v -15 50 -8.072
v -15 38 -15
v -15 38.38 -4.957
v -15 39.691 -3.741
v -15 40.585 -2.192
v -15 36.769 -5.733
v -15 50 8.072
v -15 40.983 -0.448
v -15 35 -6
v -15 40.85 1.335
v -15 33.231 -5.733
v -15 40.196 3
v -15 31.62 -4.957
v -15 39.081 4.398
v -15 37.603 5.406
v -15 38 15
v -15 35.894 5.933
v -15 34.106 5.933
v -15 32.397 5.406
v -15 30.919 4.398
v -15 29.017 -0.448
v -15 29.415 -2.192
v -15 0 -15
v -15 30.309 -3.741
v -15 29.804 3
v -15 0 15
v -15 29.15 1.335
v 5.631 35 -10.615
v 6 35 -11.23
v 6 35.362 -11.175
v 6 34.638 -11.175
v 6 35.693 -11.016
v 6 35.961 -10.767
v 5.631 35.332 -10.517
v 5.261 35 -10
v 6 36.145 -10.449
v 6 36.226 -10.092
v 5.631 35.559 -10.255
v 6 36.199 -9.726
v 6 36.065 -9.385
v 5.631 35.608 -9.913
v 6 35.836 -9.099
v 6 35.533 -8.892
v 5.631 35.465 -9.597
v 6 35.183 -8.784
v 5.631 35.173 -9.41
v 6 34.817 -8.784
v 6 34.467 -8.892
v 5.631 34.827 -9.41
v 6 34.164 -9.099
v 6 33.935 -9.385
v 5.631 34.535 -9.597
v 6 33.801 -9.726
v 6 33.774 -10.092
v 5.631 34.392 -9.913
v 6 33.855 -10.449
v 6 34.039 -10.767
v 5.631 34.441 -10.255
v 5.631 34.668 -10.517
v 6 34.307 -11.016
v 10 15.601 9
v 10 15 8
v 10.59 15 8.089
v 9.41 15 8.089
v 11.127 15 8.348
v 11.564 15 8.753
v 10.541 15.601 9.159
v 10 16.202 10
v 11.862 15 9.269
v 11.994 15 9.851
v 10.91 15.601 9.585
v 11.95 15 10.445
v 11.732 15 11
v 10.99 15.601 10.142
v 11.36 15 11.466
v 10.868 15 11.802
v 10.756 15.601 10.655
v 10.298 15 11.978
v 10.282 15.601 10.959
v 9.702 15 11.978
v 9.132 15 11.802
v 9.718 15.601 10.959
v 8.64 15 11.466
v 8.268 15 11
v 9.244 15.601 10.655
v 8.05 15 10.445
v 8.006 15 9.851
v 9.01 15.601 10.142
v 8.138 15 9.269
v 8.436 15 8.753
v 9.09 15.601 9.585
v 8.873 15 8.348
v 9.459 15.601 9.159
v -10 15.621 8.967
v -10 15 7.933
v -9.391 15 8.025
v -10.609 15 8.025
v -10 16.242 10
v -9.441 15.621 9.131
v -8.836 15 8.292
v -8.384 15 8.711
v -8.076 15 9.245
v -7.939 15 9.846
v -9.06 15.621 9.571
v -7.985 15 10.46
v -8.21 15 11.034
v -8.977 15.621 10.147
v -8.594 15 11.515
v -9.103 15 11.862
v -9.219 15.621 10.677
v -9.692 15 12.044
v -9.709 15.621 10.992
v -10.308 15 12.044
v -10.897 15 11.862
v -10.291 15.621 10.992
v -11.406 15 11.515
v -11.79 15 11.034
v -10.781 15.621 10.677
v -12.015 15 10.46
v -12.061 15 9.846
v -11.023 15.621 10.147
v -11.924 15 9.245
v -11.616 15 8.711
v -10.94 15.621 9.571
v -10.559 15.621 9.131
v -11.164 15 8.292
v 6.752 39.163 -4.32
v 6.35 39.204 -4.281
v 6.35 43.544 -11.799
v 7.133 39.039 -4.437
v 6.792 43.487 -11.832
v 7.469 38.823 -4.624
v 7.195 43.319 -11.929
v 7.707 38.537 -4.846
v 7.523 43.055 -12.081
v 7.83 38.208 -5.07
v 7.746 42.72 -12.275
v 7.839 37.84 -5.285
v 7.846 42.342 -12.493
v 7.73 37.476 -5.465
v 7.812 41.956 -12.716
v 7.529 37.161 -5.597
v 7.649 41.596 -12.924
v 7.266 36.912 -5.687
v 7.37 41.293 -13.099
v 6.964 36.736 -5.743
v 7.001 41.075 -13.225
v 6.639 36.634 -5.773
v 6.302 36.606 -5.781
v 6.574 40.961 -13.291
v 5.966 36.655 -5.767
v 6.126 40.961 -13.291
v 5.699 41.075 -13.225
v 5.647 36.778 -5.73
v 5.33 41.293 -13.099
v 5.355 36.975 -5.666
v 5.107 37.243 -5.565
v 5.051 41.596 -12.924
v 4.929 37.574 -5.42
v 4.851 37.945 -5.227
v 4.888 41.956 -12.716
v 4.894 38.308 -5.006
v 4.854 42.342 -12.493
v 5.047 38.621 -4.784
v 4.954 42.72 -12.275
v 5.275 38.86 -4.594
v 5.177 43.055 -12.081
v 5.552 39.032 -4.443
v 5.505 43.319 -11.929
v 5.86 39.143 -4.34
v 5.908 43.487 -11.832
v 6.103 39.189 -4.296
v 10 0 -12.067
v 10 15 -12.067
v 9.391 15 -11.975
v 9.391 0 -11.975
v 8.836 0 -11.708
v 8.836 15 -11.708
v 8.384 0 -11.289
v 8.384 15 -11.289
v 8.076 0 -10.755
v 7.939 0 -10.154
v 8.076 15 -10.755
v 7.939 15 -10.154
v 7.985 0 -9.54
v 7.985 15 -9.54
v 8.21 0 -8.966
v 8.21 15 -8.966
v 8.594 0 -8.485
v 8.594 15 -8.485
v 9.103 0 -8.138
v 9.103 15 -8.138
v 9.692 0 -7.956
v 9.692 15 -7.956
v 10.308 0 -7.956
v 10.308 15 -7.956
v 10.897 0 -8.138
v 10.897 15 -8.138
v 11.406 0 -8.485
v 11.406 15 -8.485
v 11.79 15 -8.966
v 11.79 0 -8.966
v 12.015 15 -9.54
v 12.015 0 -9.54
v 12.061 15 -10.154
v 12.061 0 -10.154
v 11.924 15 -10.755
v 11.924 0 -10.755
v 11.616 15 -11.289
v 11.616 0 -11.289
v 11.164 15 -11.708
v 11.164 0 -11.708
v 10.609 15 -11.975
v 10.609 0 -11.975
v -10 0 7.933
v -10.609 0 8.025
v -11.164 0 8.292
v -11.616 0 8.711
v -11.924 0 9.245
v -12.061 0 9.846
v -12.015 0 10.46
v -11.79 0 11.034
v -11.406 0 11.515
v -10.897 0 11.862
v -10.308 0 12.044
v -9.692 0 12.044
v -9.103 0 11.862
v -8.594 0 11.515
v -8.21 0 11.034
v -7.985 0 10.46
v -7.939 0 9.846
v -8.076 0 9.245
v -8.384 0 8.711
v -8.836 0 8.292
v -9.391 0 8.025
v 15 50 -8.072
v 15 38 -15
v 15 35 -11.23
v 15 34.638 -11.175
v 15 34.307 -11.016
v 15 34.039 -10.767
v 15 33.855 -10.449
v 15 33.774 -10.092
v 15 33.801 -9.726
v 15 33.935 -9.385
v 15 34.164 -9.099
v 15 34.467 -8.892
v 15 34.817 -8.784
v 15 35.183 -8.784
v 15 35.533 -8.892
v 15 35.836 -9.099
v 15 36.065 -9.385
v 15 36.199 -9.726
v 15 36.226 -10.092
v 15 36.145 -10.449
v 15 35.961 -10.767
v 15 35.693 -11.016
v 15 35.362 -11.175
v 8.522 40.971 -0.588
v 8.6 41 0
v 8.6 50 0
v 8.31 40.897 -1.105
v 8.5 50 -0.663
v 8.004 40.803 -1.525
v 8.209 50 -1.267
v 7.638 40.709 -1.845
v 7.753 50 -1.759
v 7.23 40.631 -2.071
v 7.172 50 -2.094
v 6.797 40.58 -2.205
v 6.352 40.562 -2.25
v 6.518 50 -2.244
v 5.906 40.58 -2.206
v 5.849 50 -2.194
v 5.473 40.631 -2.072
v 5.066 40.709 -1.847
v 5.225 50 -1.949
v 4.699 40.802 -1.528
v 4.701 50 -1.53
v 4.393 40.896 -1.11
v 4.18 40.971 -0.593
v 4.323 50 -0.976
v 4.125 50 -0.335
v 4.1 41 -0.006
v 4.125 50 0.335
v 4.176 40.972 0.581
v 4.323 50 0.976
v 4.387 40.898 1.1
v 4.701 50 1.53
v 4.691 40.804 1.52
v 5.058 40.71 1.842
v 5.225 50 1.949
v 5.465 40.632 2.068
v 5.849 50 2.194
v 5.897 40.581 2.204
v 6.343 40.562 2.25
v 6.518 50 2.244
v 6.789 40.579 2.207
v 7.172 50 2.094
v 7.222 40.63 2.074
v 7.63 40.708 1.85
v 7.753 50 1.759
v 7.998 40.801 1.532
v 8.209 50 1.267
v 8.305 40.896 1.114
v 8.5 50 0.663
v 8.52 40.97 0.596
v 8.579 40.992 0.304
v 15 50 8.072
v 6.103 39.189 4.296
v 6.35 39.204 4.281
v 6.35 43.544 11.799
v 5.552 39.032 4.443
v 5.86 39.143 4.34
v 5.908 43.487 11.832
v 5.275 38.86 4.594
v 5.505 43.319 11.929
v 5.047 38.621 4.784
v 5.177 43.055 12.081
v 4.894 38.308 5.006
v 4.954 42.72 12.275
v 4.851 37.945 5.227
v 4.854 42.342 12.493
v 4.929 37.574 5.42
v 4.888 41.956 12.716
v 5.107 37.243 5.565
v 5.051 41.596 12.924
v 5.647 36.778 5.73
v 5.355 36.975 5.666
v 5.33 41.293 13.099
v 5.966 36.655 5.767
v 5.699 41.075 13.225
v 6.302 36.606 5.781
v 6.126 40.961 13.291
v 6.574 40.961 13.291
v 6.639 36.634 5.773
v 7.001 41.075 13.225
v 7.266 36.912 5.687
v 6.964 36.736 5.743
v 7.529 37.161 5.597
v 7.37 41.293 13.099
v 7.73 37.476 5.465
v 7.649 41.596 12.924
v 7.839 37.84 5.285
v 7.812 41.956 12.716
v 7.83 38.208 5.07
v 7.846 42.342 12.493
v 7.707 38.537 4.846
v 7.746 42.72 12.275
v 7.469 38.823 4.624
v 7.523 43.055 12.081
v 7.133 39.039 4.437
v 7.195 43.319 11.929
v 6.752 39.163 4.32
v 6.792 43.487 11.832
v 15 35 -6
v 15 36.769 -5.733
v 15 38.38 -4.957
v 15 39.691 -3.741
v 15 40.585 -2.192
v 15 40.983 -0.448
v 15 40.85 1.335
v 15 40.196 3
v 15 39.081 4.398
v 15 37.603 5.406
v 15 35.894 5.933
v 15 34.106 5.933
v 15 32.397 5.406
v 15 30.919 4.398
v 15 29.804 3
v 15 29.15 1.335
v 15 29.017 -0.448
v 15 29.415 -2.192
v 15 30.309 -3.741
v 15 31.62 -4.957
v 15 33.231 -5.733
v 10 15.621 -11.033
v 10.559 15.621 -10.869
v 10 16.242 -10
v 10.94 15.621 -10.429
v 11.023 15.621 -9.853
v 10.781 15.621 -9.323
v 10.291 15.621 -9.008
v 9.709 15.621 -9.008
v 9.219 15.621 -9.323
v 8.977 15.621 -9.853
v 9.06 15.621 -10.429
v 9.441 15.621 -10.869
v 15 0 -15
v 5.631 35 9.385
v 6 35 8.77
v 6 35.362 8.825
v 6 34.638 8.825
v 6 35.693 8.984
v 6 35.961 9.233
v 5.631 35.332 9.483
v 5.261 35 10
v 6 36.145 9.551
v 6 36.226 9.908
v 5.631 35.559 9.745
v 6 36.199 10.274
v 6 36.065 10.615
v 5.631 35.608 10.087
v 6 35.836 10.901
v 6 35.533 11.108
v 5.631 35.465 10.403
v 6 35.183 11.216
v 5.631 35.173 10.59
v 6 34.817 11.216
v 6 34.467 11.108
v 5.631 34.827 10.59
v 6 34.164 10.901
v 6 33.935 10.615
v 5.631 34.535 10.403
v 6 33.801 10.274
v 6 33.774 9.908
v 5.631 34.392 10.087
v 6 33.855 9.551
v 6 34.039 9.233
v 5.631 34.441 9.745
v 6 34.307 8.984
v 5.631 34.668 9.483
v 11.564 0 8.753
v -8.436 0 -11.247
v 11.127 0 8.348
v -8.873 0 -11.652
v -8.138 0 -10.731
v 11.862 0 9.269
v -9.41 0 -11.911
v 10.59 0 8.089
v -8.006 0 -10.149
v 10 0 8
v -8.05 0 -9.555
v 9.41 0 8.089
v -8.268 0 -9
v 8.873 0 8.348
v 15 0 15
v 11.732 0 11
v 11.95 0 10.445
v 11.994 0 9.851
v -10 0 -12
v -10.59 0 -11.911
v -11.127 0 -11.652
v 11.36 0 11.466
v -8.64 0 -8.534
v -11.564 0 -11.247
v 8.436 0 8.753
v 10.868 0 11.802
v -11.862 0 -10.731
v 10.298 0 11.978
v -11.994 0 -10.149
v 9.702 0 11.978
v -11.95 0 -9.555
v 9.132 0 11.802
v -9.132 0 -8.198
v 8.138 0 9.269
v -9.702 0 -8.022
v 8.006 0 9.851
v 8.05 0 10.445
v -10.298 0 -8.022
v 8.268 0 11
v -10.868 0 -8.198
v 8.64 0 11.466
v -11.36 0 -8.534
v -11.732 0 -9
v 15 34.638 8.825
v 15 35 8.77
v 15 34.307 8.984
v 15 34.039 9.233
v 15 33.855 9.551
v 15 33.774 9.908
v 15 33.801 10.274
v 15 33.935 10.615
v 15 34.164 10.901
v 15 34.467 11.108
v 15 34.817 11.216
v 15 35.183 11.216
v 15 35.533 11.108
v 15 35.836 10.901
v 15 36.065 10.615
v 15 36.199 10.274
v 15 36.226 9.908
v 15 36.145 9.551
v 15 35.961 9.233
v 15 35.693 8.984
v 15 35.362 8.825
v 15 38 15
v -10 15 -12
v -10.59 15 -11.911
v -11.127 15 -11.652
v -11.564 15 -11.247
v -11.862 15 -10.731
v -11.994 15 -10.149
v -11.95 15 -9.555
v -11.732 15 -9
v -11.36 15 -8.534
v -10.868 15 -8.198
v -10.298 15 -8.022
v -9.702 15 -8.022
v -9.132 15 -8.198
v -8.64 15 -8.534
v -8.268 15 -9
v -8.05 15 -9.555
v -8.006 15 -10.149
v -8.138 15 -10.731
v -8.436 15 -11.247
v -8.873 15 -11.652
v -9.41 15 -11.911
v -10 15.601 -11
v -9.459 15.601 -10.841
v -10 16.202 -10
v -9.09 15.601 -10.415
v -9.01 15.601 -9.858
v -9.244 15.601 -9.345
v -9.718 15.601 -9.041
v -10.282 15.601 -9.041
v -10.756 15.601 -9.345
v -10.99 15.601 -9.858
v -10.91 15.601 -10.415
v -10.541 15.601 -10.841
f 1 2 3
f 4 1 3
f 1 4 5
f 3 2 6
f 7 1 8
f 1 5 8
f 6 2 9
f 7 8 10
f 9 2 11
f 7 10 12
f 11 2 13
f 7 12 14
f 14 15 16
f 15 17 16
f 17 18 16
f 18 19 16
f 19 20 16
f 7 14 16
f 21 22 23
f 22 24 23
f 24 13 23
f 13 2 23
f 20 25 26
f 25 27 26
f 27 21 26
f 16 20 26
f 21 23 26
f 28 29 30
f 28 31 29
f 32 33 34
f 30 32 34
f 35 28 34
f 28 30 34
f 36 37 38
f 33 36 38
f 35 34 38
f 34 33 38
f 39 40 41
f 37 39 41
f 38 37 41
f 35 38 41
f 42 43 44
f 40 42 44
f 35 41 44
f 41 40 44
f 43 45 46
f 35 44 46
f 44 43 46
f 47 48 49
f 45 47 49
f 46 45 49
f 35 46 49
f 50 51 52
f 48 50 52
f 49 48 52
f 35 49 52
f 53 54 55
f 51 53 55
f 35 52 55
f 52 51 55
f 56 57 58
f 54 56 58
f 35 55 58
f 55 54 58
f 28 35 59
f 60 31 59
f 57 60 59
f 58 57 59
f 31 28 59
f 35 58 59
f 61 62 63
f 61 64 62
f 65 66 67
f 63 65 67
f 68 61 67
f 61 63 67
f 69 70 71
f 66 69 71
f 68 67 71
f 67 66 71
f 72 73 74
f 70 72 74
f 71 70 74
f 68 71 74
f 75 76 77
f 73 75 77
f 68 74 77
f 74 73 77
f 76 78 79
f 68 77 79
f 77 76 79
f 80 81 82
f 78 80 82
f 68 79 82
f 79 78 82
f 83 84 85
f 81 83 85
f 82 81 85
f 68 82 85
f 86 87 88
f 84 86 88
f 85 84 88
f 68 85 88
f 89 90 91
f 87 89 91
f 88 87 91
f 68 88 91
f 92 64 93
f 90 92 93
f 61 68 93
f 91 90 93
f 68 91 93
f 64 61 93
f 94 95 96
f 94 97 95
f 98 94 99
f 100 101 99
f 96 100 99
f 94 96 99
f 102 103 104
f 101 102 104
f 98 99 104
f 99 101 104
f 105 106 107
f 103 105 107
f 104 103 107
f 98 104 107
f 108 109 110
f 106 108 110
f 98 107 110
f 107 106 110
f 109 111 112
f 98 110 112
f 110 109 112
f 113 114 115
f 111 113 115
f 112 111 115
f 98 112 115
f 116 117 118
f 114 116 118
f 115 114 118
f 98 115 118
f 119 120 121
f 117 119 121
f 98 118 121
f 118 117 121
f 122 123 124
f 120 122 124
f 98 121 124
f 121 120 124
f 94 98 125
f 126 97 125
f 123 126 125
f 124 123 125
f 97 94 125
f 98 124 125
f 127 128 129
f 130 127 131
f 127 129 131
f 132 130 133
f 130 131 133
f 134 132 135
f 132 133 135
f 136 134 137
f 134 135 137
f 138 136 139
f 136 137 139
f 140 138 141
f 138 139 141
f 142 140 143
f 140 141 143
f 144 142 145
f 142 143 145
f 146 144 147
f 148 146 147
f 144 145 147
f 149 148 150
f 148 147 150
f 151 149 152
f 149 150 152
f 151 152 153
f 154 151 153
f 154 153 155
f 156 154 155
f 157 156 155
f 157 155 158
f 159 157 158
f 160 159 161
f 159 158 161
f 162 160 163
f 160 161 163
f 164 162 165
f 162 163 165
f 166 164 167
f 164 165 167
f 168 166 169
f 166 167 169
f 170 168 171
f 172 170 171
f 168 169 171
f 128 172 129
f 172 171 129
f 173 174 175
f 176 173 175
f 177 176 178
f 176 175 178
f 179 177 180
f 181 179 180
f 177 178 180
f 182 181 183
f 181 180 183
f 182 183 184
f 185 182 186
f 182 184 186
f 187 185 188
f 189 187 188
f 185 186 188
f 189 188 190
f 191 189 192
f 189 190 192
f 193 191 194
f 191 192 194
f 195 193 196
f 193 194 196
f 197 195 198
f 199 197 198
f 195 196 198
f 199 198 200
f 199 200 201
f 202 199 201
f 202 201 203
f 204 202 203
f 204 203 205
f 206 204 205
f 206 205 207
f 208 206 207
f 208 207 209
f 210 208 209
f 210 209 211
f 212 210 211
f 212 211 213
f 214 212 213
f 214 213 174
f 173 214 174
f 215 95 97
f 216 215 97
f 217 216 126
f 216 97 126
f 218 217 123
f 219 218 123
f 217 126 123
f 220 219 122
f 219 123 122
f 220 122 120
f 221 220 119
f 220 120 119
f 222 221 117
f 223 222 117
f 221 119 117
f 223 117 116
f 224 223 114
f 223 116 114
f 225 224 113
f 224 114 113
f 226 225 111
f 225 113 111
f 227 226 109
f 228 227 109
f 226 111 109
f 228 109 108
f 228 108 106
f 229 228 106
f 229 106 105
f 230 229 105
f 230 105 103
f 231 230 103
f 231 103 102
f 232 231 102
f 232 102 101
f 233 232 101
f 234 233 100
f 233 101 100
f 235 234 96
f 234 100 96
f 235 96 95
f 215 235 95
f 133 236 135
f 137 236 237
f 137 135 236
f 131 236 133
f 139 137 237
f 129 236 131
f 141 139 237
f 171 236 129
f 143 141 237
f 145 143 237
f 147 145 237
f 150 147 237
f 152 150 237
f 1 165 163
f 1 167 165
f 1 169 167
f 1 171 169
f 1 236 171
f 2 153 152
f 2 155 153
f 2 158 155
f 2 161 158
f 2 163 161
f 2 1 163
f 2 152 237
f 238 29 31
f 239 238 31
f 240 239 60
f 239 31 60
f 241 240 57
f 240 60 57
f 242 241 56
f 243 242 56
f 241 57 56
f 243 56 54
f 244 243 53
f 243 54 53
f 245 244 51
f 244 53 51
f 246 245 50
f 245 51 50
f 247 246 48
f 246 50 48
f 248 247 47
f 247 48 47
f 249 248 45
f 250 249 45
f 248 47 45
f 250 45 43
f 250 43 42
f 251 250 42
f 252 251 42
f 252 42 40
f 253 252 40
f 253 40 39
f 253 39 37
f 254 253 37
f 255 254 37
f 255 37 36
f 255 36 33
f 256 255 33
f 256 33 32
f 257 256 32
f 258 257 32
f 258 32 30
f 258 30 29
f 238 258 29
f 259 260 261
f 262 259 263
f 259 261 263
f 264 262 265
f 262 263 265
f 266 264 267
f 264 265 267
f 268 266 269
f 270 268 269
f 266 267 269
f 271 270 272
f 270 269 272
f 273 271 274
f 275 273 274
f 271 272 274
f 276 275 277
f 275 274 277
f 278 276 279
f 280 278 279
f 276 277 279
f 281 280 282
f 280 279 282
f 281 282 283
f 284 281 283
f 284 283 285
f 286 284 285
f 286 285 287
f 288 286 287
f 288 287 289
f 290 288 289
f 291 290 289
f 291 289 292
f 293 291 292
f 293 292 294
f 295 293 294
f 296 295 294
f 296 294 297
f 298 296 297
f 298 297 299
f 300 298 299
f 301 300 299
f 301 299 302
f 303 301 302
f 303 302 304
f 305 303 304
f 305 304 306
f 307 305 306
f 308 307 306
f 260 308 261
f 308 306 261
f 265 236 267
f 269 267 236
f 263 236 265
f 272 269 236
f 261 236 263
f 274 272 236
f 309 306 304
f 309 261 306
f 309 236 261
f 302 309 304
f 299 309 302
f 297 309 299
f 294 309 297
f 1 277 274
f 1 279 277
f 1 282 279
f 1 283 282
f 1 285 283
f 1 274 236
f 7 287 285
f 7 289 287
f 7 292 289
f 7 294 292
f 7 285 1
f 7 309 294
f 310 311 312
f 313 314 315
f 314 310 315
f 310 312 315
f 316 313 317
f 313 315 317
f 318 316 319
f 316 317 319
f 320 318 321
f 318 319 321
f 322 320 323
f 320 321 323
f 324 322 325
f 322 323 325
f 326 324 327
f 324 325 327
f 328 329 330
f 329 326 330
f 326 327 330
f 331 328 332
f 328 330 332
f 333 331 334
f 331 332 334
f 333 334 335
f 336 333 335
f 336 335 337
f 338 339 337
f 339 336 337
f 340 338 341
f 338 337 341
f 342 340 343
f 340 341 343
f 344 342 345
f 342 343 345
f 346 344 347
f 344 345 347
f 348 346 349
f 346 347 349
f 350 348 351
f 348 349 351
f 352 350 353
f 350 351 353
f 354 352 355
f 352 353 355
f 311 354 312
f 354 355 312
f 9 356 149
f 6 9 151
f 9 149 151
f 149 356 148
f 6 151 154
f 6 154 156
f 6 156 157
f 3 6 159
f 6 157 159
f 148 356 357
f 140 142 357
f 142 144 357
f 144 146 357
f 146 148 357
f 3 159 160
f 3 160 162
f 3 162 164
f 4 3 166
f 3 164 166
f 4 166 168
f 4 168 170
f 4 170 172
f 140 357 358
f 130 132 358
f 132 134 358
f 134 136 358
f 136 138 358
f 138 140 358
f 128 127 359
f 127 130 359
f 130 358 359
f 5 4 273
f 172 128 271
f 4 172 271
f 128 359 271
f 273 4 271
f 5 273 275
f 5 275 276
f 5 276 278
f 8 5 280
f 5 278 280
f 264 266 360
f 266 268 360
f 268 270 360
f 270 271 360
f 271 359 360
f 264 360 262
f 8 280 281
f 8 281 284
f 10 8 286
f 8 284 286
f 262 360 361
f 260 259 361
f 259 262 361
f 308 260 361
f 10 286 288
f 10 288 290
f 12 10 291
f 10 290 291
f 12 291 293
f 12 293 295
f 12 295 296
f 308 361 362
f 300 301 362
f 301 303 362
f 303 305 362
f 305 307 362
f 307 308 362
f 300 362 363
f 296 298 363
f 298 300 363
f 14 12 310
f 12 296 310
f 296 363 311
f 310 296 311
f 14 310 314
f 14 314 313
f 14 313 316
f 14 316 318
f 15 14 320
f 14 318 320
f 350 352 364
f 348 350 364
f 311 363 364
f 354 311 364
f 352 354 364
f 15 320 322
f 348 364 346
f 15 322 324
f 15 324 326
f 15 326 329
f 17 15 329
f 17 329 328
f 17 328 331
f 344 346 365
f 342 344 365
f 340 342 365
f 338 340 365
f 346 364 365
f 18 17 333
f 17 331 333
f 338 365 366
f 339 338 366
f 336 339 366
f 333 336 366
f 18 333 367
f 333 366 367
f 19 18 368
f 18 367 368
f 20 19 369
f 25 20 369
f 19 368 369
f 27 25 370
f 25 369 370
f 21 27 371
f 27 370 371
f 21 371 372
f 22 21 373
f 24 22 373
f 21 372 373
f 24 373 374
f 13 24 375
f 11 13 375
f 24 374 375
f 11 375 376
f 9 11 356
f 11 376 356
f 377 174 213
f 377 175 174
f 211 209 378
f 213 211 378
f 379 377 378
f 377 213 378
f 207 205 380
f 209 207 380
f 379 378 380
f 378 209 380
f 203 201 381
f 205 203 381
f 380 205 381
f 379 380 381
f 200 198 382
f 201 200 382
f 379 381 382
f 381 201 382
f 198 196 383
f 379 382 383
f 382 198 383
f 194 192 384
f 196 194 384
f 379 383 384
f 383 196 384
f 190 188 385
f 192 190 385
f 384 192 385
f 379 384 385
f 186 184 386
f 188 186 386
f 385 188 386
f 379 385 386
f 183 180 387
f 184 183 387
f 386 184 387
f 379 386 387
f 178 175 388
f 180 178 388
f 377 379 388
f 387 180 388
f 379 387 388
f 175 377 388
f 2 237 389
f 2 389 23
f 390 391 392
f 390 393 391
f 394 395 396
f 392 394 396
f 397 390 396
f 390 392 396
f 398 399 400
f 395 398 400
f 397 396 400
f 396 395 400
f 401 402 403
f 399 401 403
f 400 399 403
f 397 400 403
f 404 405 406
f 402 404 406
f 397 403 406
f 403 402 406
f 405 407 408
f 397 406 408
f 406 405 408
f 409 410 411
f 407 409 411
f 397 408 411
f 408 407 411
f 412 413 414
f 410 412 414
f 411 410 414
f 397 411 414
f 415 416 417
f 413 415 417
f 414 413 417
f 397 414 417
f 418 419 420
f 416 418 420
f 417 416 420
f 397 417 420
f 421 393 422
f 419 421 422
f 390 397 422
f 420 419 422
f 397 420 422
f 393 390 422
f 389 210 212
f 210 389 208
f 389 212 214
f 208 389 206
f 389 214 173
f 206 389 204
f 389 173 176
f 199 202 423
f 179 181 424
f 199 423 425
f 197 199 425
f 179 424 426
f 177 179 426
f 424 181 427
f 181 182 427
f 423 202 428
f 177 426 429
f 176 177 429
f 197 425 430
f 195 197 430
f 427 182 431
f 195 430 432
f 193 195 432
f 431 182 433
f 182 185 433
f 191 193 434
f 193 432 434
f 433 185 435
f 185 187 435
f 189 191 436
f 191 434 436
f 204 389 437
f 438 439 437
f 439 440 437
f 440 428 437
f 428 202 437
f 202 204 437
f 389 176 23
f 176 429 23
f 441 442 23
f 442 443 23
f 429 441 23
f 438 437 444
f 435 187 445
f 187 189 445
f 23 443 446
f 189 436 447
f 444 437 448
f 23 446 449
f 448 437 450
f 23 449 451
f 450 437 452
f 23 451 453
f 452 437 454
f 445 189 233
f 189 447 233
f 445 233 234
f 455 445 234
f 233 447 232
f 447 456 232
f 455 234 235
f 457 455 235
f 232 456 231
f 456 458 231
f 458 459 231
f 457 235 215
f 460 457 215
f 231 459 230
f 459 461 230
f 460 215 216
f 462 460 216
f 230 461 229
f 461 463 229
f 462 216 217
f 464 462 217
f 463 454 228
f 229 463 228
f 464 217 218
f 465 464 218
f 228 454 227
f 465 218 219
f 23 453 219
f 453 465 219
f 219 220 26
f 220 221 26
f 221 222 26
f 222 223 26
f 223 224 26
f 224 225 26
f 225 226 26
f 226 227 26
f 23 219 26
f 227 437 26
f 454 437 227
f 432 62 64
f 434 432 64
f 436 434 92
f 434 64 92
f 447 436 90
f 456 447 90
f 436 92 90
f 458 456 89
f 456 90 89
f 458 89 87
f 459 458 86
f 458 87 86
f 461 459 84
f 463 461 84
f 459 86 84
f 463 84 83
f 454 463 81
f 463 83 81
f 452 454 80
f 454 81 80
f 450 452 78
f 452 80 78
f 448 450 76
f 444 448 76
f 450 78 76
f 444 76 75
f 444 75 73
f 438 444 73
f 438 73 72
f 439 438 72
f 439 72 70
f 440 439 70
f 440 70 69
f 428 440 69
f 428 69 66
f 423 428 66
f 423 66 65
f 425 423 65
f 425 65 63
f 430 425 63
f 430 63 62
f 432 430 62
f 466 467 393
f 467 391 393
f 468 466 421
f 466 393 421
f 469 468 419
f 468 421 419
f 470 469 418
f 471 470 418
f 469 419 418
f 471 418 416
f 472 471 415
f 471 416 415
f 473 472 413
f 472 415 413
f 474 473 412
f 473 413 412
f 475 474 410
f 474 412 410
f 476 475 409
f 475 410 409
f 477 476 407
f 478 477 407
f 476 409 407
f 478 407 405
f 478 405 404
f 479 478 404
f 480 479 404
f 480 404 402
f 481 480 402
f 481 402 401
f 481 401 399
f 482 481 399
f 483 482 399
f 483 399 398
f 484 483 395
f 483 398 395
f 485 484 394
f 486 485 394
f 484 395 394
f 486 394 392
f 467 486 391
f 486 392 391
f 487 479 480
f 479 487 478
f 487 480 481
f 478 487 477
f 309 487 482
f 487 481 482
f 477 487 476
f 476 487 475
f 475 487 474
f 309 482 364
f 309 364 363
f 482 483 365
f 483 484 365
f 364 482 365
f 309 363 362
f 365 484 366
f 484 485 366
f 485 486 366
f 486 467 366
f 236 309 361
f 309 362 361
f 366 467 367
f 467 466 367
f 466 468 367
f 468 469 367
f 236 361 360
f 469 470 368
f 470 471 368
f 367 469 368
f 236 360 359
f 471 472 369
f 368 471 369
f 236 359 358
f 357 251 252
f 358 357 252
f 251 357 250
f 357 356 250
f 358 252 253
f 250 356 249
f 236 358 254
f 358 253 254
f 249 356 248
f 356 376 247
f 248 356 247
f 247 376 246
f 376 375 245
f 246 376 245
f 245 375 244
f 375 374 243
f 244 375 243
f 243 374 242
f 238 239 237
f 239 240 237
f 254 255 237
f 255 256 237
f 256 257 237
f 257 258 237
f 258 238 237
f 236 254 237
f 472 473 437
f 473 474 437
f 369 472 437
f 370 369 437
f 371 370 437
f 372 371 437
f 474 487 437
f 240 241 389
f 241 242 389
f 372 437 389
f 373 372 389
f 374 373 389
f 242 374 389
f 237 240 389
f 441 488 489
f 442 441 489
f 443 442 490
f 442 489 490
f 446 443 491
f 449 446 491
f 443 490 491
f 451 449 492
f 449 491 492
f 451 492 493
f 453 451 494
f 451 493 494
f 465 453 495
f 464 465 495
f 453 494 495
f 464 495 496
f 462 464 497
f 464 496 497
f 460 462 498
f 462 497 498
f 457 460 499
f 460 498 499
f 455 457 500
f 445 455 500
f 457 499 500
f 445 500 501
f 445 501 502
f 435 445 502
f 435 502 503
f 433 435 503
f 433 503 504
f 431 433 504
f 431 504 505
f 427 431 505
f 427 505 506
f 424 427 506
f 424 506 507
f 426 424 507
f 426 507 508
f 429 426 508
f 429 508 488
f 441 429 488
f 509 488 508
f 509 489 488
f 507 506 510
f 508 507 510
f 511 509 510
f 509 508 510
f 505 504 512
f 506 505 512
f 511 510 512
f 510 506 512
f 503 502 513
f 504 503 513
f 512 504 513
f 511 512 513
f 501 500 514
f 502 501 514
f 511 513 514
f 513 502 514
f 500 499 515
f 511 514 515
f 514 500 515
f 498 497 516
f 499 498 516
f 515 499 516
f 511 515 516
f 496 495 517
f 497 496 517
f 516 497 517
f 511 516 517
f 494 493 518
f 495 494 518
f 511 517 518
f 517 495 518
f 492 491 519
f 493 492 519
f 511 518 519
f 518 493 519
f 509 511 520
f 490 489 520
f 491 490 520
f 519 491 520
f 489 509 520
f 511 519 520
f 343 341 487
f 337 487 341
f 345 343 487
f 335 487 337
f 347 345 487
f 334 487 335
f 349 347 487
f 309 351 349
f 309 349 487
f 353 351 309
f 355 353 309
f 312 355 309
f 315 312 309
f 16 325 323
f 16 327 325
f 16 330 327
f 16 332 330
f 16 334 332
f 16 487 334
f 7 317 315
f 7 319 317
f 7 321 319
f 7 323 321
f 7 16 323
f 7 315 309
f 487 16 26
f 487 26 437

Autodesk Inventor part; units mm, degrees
ref_plane "XZ Plane" through (0, 0, 0) normal (0, 1, 0) x (-1, 0, 0)
ref_plane "XY Plane" through (0, 0, 0) normal (0, 0, 1) x (1, 0, 0)
sketch "Sketch1" plane through (0, 0, 0) normal (0, 1, 0) x (-1, 0, 0)
  line L0 (-15, -15) -> (15, -15)
  line L1 (15, -15) -> (15, 15)
  line L2 (15, 15) -> (-15, 15)
  line L3 (-15, 15) -> (-15, -15)
  line L4 (-15, -15) -> (15, 15) construction
  line L5 (15, -15) -> (-15, 15) construction
  point P0 (0, 0)
  dimension "d0" = 30
  dimension "d1" = 30
extrude "Extrusion1" add sketch "Sketch1" along normal blind 50
sketch "Sketch2" plane through (15, 0, 15) normal (1, 0, 0) x (0, 0, -1)
  line L0 (15, 0) -> (15, 35) construction
  line L1 (0, 0) -> (30, 0) projected
  circle A0 centre (15, 35) radius 6
  dimension "d4" = 35
  dimension "d6" = 12
extrude "Extrusion2" cut sketch "Sketch2" against normal through all
sketch "Sketch7" plane through (0, 50, 0) normal (0, 1, 0) x (1, 0, 0)
  line L0 (15, -15) -> (15, 15) projected
  line L1 (6.5, 0) -> (6.35, 0)
  circle A0 centre (6.35, 0) radius 2.25
  point P0 (0, 0)
  dimension "d33" = 4.5
  dimension "d119" = 8.65
extrude "Extrusion7" cut sketch "Sketch7" against normal blind 12
ref_plane "Work Plane1" through (6.35, 0, 0) normal (1, 0, 0) x (0, 1, 0)
sketch "Sketch14" plane through (6.35, 0, 0) normal (1, 0, 0) x (0, 1, 0)
  line L0 (50, -15) -> (50, 15) projected
  circle A0 centre (35, 0) radius 6 projected
  line L1 (50, 0) -> (35, 0)
  line L2 (35, 0) -> (52.3205, -30)
  line L3 (35, 0) -> (61.673, 0)
  line L4 (35, 0) -> (36.7321, 0)
  line L5 (36.7321, 0) -> (54.0526, -30)
  line L6 (54.0526, -30) -> (52.3205, -30)
  line L7 (52, -6.9171) -> (34.5359, -17)
  line L8 (34.5359, -17) -> (52, -17)
  line L9 (52, -17) -> (52, -6.9171)
  line L10 (0, -15) -> (50, -15) projected
  line L11 (0, -15) -> (50, -15) projected
  point P0 (0, 0)
  point P1 (36.7321, 0)
  point P2 (38, -15)
  dimension "d55" = 60
  dimension "d57" = 120
  dimension "d72" = 1.5
  dimension "d73" = 30
  dimension "d112" = 2
  dimension "d113" = 2
  dimension "d114" = 12
revolve "Revolution1" cut sketch "Sketch14" angle 360 about axis through (6.35, 35, 0) along (0, 0.5, -0.8660254) contours L10 L2 L7 L5 | L5 L8 L2 L10 | L7 L2 A0 L5 | L5 L6 L2 L8 | A0 L2 L1 L5
extrude "Extrusion11" cut sketch "Sketch14" along normal blind 99 and the other way blind 99 contours L10 L5 L7 L0 | L0 L7 L9 L8 L5 L10 | L10 L2 L7 L5 | L5 L8 L2 L10 | L10 L7 L2 | L2 L8 L7 L10
mirror "Mirror4" about plane through (0, 0, 0) normal (0, 0, 1) of "Revolution1", "Extrusion11"
sketch "Sketch19" plane through (0, 0, 0) normal (0, -1, 0) x (1, 0, 0)
  point P0 (0, 0)
  point P1 (-10, 10)
  point P2 (10, -10)
  dimension "d97" = 10
  dimension "d98" = 10
  dimension "d99" = 10
  dimension "d100" = 10
hole "Hole2" at (-10, 0, 10) at (10, 0, -10) direction (0, 1, 0) diameter 4.134 depth 15 tip angle 118 thread size "M5x0.8" class "6H" standard "ISO Metric profile"
sketch "Sketch20" plane through (0, 0, 0) normal (0, -1, 0) x (1, 0, 0)
  point P0 (0, 0)
  point P1 (10, 10)
  point P2 (-10, -10)
  dimension "d108" = 10
  dimension "d109" = 10
  dimension "d110" = 10
  dimension "d111" = 10
hole "Hole3" at (10, 0, 10) at (-10, 0, -10) direction (0, 1, 0) diameter 4 depth 15 tip angle 118
sketch "Sketch21" plane through (15, 0, 15) normal (1, 0, 0) x (0, 0, -1)
  line L0 (0, 0) -> (30, 0) projected
  circle A0 centre (15, 35) radius 6 projected
  point P0 (15, 0)
  point P1 (5, 35)
  point P2 (25, 35)
  point P3 (15, 0)
  point P4 (15, 0)
  dimension "d127" = 10
  dimension "d128" = 10
hole "Hole4" at (15, 35, 10) at (15, 35, -10) direction (-1, 0, 0) diameter 2.459 depth 9 tip angle 118 thread size "M3x0.5" class "6H" standard "ISO Metric profile"
equation "\"d99\" = d98"
equation "\"d100\" = d97"
equation "\"d110\" = d109"
equation "\"d111\" = d108"
properties part number "23-0064 Diode holder" material "Stainless Steel 316 (X5CrNiMo17.12.2)"
